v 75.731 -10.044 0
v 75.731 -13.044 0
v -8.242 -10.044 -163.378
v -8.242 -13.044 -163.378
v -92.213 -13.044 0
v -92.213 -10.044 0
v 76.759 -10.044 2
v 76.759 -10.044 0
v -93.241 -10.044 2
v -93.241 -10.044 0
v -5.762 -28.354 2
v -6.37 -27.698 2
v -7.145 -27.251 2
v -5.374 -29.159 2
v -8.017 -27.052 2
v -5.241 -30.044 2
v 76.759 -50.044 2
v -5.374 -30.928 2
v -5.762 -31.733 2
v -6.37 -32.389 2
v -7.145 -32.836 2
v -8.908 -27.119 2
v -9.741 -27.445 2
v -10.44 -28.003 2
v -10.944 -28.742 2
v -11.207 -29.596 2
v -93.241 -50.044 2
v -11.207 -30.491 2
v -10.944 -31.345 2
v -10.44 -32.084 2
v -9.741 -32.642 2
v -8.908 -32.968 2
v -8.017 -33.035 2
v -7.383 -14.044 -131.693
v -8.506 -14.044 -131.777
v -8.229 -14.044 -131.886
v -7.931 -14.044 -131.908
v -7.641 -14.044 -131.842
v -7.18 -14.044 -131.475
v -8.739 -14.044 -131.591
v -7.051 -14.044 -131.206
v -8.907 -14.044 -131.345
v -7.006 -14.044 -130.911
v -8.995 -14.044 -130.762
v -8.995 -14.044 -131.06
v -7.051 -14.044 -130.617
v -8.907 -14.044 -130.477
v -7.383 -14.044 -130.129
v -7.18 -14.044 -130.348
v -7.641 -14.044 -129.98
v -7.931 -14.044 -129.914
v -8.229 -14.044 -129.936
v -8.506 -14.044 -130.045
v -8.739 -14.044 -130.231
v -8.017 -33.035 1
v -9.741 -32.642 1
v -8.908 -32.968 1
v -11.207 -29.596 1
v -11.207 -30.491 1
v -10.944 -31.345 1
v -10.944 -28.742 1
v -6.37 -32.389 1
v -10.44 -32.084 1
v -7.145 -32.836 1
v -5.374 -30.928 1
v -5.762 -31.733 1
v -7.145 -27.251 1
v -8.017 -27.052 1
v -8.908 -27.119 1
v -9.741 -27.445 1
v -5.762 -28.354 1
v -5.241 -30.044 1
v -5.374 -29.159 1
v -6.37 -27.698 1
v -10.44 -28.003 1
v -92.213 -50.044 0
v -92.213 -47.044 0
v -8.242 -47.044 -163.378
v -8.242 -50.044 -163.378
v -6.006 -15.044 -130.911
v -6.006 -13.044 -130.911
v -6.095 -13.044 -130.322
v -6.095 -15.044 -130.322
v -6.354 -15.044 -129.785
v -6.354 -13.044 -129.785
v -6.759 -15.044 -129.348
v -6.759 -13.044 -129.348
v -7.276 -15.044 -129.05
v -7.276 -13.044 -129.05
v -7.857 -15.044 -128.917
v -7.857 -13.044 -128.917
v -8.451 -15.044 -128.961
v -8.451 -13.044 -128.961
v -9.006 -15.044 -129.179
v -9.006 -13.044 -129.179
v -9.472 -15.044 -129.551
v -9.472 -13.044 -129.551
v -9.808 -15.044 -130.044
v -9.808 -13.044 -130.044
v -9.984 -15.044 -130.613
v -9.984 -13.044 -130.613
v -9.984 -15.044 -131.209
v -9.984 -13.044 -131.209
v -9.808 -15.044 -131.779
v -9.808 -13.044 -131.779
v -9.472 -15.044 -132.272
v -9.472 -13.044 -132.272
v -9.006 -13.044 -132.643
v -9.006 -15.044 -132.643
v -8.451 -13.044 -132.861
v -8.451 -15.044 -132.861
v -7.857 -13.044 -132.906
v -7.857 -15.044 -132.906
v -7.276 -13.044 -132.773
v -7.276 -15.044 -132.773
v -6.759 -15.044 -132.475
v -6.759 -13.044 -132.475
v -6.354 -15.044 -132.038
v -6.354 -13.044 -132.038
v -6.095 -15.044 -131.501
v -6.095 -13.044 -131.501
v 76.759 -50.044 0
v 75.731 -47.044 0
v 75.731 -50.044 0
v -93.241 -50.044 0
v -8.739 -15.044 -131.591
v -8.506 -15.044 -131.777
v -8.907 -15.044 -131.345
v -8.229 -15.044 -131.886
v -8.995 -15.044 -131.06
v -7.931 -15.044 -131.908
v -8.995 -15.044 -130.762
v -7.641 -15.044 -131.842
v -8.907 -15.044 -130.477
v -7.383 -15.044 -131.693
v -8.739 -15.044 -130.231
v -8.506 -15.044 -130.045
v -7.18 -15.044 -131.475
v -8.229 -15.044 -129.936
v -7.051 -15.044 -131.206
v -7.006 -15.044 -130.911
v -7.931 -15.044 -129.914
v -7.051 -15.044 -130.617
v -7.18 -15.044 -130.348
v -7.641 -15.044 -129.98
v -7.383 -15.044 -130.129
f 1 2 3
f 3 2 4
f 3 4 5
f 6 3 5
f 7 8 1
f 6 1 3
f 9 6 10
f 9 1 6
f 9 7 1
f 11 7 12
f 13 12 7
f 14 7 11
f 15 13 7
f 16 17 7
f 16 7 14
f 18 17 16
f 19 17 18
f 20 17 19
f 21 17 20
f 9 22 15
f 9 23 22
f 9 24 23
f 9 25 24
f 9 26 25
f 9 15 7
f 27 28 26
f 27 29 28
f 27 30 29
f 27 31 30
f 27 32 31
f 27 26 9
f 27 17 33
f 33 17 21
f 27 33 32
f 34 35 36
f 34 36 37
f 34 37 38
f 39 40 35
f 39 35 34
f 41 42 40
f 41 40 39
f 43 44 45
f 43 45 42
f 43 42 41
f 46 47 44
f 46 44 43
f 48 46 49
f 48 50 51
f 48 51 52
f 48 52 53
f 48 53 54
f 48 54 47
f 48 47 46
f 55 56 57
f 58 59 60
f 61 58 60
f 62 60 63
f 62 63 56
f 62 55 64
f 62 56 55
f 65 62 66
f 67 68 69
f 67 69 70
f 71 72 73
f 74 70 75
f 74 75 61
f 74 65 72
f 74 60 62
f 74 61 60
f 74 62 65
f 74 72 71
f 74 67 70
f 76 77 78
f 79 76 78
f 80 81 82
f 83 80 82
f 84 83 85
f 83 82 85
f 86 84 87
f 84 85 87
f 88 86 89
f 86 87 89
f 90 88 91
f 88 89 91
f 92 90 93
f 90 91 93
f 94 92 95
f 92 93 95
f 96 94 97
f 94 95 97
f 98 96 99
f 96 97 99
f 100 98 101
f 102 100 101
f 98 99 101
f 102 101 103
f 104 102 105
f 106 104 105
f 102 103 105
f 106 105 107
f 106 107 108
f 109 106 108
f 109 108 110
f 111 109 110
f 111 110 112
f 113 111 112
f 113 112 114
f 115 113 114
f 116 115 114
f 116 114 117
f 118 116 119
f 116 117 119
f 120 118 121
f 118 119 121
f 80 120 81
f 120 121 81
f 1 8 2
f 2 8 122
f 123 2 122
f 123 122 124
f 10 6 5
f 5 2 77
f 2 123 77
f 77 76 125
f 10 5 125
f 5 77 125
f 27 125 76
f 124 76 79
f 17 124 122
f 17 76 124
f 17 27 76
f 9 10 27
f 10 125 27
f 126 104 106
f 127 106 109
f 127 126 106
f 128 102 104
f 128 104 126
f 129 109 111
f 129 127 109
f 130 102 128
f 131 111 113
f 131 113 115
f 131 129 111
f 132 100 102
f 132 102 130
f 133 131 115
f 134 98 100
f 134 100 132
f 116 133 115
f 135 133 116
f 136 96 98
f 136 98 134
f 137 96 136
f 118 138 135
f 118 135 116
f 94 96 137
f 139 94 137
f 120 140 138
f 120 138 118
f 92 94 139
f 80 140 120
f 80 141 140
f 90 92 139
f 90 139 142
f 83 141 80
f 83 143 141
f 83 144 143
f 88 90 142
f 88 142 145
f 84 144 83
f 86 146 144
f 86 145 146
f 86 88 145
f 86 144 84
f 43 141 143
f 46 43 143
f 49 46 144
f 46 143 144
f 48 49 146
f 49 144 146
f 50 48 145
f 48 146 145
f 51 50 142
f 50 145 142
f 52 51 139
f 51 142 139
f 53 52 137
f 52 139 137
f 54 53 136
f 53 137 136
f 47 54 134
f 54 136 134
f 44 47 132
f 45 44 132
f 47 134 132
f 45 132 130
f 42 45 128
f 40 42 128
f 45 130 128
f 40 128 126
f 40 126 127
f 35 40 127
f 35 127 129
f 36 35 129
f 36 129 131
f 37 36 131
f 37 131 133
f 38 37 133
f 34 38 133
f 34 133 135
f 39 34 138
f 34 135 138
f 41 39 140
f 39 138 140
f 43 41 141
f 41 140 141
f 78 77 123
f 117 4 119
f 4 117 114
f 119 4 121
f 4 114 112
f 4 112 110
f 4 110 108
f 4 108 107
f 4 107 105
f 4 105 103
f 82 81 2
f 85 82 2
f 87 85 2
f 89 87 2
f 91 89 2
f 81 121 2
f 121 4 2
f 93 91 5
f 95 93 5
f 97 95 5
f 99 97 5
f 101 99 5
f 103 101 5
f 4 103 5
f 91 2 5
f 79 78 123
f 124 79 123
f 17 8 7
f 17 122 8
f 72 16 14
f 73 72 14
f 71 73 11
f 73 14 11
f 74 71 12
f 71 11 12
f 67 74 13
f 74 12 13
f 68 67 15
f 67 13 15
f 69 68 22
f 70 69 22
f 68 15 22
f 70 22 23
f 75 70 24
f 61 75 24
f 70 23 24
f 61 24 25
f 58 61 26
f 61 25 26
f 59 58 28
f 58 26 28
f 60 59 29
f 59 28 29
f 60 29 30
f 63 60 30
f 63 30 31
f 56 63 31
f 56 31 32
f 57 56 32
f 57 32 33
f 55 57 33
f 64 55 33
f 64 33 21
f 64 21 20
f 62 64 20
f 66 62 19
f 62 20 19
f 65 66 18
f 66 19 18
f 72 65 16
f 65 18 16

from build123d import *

# Parameters (mm, degrees)
F0_W      = 170
F0_H      = 34
F1_DEPTH  = 2
F2_W      = 170
F2_H      = 2
F4_DEPTH  = 3
F5_W      = 170
F5_H      = 2
F7_DEPTH  = 3
F8_R      = 2
F9_DEPTH  = 2
F10_R     = 1
F11_DEPTH = 1
F12_R     = 3
F13_DEPTH = 1


with BuildPart() as f1:
    # F0 (on Top) → F1 (new body)
    with BuildSketch(Plane.XY):
        with Locations((-8.2408198714, -30.0435358584)):
            Rectangle(F0_W, F0_H)
    extrude(amount=F1_DEPTH)

    # F2 (on face) + F3 (on face) → F4 (join)
    with BuildSketch(Plane.XZ.offset(47.0435358584)):
        with Locations((-8.2408198714, 1)):
            Rectangle(F2_W, F2_H)
    with BuildSketch(Plane.XZ.offset(47.0435358584)):
        Polygon((75.7311444739, 0), (-92.2127468976, 0), (-8.2416068763, -163.3778810501), align=None)
    extrude(amount=F4_DEPTH)

    # F6 (on face) + F5 (on face) → F7 (join)
    with BuildSketch(Plane(origin=(0, -13.0435358584, 0), x_dir=(-1, 0, 0), z_dir=(0, 1, 0))):
        Polygon((92.2128885412, 0), (-75.7311794344, 0), (8.2415537909, -163.3778512478), align=None)
    with BuildSketch(Plane(origin=(0, -13.0435358584, 0), x_dir=(-1, 0, 0), z_dir=(0, 1, 0))):
        with Locations((8.2408198714, 1)):
            Rectangle(F5_W, F5_H)
    extrude(amount=F7_DEPTH)

    # F8 (on face) → F9 (join)
    with BuildSketch(Plane.XZ.offset(13.0435358584)):
        with Locations((-8.0062086027, -130.911280853)):
            Circle(F8_R)
    extrude(amount=F9_DEPTH)

    # F10 (on face) → F11 (cut)
    with BuildSketch(Plane.XZ.offset(15.0435358584)):
        with Locations((-8.0062086027, -130.911280853)):
            Circle(F10_R)
    extrude(amount=-F11_DEPTH, mode=Mode.SUBTRACT)

    # F12 (on face) → F13 (cut)
    with BuildSketch(Plane.XY.offset(2)):
        with Locations((-8.2408198714, -30.0435358584)):
            Circle(F12_R)
    extrude(amount=-F13_DEPTH, mode=Mode.SUBTRACT)


solid = f1.part
